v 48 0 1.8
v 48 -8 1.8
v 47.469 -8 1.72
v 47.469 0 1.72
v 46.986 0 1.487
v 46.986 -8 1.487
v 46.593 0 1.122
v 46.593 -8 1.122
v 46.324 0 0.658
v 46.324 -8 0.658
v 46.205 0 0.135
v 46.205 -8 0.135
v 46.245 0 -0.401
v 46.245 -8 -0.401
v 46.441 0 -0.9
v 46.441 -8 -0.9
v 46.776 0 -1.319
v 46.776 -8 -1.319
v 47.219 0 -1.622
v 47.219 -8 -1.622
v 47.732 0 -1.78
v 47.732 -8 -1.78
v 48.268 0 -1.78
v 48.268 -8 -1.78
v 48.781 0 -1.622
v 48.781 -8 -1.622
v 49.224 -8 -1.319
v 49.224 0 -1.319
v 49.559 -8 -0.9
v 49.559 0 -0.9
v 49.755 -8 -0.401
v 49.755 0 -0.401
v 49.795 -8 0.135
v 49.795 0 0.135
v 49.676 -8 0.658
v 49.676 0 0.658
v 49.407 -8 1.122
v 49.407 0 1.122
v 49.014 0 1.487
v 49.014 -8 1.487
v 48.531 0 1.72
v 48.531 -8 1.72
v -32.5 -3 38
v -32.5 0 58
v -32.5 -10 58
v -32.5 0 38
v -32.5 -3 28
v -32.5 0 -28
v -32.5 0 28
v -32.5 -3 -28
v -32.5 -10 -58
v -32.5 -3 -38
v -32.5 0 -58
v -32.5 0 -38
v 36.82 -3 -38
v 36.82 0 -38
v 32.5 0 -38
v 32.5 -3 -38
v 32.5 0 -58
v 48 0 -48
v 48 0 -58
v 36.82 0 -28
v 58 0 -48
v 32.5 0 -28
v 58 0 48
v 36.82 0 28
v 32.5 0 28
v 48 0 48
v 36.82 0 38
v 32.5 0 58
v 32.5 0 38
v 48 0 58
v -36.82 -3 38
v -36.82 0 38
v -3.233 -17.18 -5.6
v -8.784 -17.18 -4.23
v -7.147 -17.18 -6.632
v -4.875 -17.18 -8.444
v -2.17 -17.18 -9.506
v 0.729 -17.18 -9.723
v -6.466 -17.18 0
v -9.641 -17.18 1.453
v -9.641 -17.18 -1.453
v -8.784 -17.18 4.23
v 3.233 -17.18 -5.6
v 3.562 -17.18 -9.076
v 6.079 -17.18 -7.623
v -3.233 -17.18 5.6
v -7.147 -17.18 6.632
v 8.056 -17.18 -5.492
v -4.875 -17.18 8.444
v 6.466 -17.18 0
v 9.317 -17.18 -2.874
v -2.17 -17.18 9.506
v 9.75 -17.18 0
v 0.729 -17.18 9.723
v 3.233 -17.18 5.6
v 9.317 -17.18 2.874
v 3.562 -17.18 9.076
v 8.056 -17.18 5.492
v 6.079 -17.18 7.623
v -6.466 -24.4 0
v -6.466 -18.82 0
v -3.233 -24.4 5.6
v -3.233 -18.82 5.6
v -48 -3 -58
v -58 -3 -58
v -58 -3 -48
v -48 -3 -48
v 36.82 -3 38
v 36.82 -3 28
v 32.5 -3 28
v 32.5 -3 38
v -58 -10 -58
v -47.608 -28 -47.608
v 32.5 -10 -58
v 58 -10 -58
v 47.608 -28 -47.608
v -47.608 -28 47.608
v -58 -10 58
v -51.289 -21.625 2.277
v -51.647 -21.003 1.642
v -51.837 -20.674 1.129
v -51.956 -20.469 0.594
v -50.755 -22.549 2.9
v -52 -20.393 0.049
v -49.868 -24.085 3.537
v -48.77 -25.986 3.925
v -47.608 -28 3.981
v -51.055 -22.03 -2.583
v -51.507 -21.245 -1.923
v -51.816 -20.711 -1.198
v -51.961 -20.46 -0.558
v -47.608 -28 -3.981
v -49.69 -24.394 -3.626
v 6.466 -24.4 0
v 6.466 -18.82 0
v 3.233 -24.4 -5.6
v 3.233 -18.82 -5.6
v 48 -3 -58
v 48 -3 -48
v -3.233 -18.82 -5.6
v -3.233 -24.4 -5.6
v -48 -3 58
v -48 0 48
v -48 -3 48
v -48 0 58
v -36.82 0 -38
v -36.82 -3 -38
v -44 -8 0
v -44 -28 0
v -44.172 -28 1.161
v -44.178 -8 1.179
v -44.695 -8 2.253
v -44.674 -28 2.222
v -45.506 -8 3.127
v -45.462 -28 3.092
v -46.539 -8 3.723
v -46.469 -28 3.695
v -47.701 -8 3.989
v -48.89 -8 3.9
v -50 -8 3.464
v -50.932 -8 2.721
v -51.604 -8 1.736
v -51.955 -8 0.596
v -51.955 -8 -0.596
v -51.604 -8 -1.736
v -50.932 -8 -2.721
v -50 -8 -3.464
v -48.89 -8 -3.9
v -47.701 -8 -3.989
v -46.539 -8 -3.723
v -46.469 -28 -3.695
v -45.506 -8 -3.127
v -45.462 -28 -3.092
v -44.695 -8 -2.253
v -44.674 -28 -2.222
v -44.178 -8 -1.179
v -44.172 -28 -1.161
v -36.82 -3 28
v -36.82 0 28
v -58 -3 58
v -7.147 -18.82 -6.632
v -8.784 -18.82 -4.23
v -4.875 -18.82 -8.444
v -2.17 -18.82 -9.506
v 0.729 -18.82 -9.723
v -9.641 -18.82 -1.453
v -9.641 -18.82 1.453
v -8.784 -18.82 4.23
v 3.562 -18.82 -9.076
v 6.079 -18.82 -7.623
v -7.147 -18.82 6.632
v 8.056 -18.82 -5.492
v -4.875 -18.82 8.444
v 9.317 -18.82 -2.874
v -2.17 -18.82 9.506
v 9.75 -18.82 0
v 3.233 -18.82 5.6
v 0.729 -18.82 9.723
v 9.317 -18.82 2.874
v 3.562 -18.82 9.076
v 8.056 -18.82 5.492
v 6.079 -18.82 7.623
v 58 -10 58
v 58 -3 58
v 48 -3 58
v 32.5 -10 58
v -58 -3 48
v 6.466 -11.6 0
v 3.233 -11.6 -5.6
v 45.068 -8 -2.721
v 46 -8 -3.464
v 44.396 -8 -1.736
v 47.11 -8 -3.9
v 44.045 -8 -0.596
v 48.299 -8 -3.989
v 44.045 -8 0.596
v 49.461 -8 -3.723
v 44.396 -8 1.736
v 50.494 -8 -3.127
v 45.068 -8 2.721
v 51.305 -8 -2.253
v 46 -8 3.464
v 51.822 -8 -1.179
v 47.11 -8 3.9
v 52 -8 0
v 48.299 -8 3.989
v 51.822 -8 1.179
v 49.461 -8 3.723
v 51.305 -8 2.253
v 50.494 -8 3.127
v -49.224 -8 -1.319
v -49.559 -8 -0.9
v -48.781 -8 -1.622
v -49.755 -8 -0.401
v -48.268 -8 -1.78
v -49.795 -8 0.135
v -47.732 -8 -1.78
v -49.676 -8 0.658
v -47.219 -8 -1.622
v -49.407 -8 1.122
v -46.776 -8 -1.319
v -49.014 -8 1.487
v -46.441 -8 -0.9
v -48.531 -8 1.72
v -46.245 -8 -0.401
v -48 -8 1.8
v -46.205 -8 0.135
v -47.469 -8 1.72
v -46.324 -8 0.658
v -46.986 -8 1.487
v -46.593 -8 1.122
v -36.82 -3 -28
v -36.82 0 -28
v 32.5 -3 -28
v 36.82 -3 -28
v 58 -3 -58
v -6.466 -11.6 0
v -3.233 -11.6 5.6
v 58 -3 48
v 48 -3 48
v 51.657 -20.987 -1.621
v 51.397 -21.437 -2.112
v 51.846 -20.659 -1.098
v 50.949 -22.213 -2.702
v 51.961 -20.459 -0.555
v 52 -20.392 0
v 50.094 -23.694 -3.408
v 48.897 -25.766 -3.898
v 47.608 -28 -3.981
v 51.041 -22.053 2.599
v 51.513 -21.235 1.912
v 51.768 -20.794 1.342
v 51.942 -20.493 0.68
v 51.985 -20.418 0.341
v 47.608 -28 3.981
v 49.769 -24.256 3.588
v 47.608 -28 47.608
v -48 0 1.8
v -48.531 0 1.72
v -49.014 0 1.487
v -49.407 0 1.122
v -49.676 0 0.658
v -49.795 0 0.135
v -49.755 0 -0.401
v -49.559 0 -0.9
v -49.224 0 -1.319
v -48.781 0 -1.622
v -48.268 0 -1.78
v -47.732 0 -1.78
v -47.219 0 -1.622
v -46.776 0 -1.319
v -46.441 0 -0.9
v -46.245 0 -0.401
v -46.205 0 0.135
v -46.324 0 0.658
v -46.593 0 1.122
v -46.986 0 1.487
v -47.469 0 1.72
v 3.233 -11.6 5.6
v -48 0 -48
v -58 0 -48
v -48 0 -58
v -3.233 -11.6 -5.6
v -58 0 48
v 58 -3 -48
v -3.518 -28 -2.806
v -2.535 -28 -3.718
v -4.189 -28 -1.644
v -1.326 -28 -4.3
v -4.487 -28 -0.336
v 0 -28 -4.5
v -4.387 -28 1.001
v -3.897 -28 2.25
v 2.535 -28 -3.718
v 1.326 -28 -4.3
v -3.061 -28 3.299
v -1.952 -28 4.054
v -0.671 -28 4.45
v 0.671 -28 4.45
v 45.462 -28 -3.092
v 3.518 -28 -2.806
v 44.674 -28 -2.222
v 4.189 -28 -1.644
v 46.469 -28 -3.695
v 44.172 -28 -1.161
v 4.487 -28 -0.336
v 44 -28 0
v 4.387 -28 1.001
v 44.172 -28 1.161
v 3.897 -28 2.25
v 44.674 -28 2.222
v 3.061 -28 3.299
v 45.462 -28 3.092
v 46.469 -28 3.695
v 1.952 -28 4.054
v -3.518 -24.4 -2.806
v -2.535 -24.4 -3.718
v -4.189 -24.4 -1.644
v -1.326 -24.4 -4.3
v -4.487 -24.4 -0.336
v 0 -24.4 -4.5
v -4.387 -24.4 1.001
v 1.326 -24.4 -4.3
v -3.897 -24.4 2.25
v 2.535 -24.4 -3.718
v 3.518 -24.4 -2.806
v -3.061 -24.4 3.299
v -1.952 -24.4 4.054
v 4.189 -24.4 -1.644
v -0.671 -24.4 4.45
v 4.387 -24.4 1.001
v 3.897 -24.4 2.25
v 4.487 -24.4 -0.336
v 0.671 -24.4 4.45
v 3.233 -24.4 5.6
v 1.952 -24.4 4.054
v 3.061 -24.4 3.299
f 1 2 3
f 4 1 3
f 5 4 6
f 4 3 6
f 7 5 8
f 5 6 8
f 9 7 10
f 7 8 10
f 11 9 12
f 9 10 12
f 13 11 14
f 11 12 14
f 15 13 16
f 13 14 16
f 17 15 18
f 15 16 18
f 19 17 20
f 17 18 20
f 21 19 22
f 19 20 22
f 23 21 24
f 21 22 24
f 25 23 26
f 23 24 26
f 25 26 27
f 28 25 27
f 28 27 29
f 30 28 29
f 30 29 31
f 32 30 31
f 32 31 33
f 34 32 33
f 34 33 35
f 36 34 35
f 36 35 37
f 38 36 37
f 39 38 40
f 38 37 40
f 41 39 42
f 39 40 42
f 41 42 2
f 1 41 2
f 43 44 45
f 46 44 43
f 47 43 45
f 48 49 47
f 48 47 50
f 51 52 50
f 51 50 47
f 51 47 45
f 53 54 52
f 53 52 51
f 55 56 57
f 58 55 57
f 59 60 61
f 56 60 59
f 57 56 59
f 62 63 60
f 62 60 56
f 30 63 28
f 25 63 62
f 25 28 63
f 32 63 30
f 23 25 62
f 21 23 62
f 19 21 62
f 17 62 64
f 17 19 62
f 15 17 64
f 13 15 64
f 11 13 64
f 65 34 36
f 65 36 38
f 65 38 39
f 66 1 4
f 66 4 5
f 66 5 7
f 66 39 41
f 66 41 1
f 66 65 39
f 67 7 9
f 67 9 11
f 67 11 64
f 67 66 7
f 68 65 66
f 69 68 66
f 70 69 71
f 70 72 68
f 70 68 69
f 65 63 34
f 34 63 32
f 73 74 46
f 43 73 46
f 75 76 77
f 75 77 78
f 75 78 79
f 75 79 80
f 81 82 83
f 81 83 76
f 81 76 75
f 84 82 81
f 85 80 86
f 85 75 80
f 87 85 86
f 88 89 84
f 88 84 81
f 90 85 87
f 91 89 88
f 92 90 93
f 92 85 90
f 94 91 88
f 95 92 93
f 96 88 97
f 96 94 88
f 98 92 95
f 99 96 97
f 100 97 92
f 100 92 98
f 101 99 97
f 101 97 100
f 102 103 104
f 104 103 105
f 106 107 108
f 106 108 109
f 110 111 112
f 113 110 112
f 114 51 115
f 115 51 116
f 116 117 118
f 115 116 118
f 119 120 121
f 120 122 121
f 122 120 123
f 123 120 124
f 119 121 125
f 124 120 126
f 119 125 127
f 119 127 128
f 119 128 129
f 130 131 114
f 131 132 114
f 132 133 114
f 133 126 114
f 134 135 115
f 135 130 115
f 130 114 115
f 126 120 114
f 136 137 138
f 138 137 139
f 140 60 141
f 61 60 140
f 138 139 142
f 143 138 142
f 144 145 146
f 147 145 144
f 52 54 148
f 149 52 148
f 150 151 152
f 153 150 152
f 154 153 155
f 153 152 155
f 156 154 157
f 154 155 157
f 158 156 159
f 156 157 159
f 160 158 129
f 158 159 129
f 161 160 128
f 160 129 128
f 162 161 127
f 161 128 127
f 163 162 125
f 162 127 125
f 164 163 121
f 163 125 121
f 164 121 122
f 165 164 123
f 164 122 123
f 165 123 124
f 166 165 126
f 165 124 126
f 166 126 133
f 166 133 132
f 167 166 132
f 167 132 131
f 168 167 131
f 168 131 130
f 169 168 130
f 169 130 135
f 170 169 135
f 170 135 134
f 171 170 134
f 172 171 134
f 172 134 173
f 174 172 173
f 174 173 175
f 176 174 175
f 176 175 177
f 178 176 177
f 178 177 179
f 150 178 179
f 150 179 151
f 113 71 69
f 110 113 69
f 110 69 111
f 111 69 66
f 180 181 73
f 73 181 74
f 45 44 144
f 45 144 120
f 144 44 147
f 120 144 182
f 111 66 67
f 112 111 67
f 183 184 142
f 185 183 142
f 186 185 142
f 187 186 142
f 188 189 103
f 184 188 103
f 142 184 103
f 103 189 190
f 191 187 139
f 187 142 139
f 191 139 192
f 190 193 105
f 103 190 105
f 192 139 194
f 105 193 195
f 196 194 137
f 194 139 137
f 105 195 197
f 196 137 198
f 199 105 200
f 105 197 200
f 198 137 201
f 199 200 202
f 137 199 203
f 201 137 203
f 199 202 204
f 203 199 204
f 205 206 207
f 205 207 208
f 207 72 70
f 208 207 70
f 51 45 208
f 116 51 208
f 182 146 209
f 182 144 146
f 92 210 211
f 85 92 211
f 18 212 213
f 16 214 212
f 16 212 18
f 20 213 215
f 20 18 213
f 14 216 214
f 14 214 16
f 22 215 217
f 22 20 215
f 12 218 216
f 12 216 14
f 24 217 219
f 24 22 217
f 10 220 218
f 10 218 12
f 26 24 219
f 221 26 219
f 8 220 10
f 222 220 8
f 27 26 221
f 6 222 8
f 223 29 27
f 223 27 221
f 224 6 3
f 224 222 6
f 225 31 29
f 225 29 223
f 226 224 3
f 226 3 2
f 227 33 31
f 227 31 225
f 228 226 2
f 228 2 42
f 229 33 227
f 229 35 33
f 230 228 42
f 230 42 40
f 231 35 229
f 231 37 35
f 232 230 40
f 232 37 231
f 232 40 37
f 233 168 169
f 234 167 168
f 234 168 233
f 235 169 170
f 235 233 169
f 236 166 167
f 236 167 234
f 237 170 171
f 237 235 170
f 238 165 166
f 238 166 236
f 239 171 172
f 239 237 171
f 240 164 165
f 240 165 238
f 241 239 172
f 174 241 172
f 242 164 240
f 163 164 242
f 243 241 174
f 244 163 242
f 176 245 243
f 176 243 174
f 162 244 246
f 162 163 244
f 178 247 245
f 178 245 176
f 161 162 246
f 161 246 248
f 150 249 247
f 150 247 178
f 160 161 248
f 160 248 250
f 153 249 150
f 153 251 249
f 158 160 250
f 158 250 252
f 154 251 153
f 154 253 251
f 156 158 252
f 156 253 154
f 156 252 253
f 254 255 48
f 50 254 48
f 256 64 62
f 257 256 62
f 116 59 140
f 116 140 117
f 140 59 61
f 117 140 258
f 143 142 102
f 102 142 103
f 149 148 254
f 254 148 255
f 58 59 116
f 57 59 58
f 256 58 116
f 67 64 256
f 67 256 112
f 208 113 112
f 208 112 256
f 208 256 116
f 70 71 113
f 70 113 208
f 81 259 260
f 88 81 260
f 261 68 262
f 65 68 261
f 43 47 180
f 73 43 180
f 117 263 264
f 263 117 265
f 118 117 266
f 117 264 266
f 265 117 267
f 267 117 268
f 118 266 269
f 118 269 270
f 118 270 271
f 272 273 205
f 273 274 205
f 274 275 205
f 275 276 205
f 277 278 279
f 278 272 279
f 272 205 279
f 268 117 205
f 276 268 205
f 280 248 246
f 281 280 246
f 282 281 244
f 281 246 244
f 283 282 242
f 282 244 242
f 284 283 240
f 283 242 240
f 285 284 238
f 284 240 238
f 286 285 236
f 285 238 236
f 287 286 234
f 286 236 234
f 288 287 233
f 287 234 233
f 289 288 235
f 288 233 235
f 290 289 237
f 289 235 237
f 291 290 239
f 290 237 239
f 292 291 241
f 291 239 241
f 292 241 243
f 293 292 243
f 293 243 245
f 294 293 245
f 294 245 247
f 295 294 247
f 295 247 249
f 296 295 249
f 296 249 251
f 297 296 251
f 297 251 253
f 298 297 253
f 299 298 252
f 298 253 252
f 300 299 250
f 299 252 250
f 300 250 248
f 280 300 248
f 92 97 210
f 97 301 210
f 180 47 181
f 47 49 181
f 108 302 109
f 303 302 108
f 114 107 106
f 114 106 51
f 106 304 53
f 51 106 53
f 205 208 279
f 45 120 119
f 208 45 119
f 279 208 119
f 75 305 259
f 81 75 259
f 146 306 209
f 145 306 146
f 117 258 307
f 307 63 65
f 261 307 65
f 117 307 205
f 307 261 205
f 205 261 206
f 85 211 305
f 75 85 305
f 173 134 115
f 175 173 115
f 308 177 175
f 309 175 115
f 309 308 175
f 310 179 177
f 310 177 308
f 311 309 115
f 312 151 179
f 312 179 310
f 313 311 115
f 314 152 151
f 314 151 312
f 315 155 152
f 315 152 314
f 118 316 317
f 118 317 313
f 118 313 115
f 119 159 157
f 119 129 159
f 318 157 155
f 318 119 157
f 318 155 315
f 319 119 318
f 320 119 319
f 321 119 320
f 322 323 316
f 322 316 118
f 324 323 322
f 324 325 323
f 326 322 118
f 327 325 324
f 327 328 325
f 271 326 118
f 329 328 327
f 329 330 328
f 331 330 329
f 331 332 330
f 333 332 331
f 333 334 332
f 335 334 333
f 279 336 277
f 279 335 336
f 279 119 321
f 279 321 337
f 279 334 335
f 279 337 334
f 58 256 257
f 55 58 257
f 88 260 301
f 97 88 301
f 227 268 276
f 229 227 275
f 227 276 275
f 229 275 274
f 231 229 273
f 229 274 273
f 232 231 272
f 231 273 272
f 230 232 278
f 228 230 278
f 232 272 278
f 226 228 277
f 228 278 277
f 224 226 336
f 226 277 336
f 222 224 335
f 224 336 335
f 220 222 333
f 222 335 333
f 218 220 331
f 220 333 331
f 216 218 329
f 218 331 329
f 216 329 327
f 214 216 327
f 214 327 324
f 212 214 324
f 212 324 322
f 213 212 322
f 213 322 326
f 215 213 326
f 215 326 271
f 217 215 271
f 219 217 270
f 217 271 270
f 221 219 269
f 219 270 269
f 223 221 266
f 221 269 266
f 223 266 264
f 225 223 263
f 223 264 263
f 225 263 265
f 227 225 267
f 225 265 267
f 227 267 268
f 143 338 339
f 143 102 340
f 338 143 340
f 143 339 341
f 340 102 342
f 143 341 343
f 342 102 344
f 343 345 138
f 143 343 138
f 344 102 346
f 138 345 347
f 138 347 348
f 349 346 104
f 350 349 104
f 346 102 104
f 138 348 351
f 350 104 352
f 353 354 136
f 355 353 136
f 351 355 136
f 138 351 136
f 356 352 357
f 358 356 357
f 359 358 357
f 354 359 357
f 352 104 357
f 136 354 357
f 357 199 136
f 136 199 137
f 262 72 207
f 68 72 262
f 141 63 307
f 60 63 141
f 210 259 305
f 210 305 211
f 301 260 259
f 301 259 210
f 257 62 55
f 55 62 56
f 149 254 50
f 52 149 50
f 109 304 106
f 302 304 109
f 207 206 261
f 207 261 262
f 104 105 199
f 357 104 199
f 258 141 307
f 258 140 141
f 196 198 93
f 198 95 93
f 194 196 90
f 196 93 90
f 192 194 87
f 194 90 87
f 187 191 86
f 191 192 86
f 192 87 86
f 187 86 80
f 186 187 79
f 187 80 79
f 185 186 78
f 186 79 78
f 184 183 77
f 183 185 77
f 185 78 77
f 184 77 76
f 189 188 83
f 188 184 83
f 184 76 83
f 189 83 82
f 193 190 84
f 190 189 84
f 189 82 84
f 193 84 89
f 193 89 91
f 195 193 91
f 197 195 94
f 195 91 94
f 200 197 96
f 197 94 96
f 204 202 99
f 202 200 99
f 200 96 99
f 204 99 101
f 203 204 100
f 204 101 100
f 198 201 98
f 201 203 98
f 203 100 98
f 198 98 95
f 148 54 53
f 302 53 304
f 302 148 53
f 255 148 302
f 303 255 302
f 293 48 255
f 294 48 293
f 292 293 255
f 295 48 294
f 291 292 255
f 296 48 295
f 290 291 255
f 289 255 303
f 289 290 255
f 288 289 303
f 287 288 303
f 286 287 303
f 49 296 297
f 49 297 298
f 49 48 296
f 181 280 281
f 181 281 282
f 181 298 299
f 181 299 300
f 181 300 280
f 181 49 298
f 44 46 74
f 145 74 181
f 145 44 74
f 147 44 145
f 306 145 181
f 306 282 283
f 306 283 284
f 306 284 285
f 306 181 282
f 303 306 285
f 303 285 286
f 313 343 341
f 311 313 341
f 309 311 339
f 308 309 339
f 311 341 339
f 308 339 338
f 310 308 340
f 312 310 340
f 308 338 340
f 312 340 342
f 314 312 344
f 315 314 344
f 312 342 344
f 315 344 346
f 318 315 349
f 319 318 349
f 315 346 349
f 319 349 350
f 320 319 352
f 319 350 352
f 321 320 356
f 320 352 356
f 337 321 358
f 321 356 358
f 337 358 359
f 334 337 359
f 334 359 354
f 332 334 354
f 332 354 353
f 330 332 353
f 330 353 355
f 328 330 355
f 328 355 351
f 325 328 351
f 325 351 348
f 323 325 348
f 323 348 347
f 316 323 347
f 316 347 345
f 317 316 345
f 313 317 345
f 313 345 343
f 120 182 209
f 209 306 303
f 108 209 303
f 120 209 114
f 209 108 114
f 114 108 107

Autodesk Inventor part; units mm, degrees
ref_plane "YZ Plane" through (0, 0, 0) normal (1, 0, 0) x (0, 1, 0)
ref_plane "XZ Plane" through (0, 0, 0) normal (0, 1, 0) x (-1, 0, 0)
ref_plane "XY Plane" through (0, 0, 0) normal (0, 0, 1) x (1, 0, 0)
sketch "Boceto31" plane through (0, 0, 0) normal (0, 1, 0) x (-1, 0, 0)
  line L0 (-58, 58) -> (58, 58)
  line L1 (58, 58) -> (58, -58)
  line L2 (58, -58) -> (-58, -58)
  line L3 (-58, -58) -> (-58, 58)
  line L4 (-58, 58) -> (58, -58) construction
  line L5 (58, 58) -> (-58, -58) construction
  line L6 (-32.5, 58) -> (32.5, 58)
  line L7 (32.5, 58) -> (32.5, -58)
  line L8 (32.5, -58) -> (-32.5, -58)
  line L9 (-32.5, -58) -> (-32.5, 58)
  line L10 (-32.5, 58) -> (32.5, -58) construction
  line L11 (32.5, 58) -> (-32.5, -58) construction
  line L12 (-48, 0) -> (48, 0) construction
  point P0 (0, 0)
  dimension "d155" = 116
  dimension "d156" = 116
  dimension "d157" = 65
  dimension "d158" = 96
extrude "Extrusión10" add sketch "Boceto31" against normal blind 10 contours L0 L9 L2 L3 | L0 L1 L2 L7
sketch "Boceto32" plane through (0, -10, 0) normal (0, -1, 0) x (1, 0, 0)
  line L0 (-32.5, 58) -> (-58, 58) projected
  line L1 (58, -58) -> (58, 58) projected
  line L2 (-58, 58) -> (58, 58)
  line L3 (58, 58) -> (58, -58)
  line L4 (58, -58) -> (-58, -58)
  line L5 (-58, -58) -> (-58, 58)
  point P0 (0, 0)
extrude "Extrusión11" add sketch "Boceto32" along normal blind 18 draft -30
hole "Agujero7" at (-48, 0, 0) at (48, 0, 0) direction (0, -1, 0) diameter 3.6 end through all clearance for "Tornillo para maquinaria de cabeza plana" size "M3" standard "Perfil M métrico ANSI"
ref_plane "Plano de trabajo10" through (0, -18, 0) normal (0, -1, 0) x (1, 0, 0)
sketch "Boceto33" plane through (0, -18, 0) normal (0, -1, 0) x (1, 0, 0)
  line L0 (6.4663, 0) -> (3.2332, -5.6)
  line L1 (3.2332, -5.6) -> (-3.2332, -5.6)
  line L2 (-3.2332, -5.6) -> (-6.4663, 0)
  line L3 (-6.4663, 0) -> (-3.2332, 5.6)
  line L4 (-3.2332, 5.6) -> (3.2332, 5.6)
  line L5 (3.2332, 5.6) -> (6.4663, 0)
  point P0 (0, 0)
  point P1 (0, 0)
  dimension "d212" = 11.2
extrude "Extrusión12" cut sketch "Boceto33" along normal mid plane 12.8
sketch "Boceto34" plane through (0, -28, 0) normal (0, -1, 0) x (1, 0, 0)
  arc A0 (-47.6077, 1.7567) -> (-47.6077, -1.7567) centre (-48, 0) ccw projected
  circle A1 centre (-48, 0) radius 4
  line L0 (-17.8562, 0) -> (-10.0366, 0) construction
  circle A2 centre (48, 0) radius 4
  arc A3 (47.6077, -1.7567) -> (47.6077, 1.7567) centre (48, 0) ccw projected
  point P0 (0, 0)
  point P1 (0, 0)
  dimension "d194" = 8
  dimension "d197" = 96
hole "Agujero9" at (0, -28, 0) direction (0, 1, 0) diameter 9 depth 3.6 clearance for "Perno de cabeza hexagonal" size "M8" standard "Perfil M métrico ANSI"
sketch "Boceto35" plane through (0, 0, 0) normal (0, 1, 0) x (1, 0, 0)
  line L0 (-58, -58) -> (-58, 58) projected
  line L1 (-58, 58) -> (-48, 58)
  line L2 (-48, 58) -> (-48, 48)
  line L3 (-48, 48) -> (-58, 48)
  line L4 (-58, 48) -> (-58, 58)
  line L5 (-32.5, 58) -> (-32.5, -58) projected
  line L6 (-32.5, 38) -> (-36.8198, 38)
  line L7 (-36.8198, 38) -> (-36.8198, 28)
  line L8 (-36.8198, 28) -> (-32.5, 28)
  line L9 (-32.5, 28) -> (-32.5, 38)
  line L10 (-32.5, 58) -> (-58, 58) projected
  point P0 (0, 0)
  dimension "d188" = 10
  dimension "d189" = 10
  dimension "d190" = 10
  dimension "d191" = 20
extrude "Extrusión13" cut sketch "Boceto35" against normal blind 3
mirror "Simetría2" about plane through (0, 0, 0) normal (1, 0, 0) of "Extrusión13"
mirror "Simetría3" about plane through (0, 0, 0) normal (0, 0, 1) of "Extrusión13", "Simetría2"
extrude "Extrusión14" cut sketch "Boceto34" against normal blind 20
sketch "Boceto37" plane through (0, -18, 0) normal (0, -1, 0) x (1, 0, 0)
  circle A0 centre (0, 0) radius 9.75
  dimension "d209" = 19.5
extrude "Extrusión16" cut sketch "Boceto37" along normal mid plane 1.64
properties part number "soporte_v2_3DPrint"
